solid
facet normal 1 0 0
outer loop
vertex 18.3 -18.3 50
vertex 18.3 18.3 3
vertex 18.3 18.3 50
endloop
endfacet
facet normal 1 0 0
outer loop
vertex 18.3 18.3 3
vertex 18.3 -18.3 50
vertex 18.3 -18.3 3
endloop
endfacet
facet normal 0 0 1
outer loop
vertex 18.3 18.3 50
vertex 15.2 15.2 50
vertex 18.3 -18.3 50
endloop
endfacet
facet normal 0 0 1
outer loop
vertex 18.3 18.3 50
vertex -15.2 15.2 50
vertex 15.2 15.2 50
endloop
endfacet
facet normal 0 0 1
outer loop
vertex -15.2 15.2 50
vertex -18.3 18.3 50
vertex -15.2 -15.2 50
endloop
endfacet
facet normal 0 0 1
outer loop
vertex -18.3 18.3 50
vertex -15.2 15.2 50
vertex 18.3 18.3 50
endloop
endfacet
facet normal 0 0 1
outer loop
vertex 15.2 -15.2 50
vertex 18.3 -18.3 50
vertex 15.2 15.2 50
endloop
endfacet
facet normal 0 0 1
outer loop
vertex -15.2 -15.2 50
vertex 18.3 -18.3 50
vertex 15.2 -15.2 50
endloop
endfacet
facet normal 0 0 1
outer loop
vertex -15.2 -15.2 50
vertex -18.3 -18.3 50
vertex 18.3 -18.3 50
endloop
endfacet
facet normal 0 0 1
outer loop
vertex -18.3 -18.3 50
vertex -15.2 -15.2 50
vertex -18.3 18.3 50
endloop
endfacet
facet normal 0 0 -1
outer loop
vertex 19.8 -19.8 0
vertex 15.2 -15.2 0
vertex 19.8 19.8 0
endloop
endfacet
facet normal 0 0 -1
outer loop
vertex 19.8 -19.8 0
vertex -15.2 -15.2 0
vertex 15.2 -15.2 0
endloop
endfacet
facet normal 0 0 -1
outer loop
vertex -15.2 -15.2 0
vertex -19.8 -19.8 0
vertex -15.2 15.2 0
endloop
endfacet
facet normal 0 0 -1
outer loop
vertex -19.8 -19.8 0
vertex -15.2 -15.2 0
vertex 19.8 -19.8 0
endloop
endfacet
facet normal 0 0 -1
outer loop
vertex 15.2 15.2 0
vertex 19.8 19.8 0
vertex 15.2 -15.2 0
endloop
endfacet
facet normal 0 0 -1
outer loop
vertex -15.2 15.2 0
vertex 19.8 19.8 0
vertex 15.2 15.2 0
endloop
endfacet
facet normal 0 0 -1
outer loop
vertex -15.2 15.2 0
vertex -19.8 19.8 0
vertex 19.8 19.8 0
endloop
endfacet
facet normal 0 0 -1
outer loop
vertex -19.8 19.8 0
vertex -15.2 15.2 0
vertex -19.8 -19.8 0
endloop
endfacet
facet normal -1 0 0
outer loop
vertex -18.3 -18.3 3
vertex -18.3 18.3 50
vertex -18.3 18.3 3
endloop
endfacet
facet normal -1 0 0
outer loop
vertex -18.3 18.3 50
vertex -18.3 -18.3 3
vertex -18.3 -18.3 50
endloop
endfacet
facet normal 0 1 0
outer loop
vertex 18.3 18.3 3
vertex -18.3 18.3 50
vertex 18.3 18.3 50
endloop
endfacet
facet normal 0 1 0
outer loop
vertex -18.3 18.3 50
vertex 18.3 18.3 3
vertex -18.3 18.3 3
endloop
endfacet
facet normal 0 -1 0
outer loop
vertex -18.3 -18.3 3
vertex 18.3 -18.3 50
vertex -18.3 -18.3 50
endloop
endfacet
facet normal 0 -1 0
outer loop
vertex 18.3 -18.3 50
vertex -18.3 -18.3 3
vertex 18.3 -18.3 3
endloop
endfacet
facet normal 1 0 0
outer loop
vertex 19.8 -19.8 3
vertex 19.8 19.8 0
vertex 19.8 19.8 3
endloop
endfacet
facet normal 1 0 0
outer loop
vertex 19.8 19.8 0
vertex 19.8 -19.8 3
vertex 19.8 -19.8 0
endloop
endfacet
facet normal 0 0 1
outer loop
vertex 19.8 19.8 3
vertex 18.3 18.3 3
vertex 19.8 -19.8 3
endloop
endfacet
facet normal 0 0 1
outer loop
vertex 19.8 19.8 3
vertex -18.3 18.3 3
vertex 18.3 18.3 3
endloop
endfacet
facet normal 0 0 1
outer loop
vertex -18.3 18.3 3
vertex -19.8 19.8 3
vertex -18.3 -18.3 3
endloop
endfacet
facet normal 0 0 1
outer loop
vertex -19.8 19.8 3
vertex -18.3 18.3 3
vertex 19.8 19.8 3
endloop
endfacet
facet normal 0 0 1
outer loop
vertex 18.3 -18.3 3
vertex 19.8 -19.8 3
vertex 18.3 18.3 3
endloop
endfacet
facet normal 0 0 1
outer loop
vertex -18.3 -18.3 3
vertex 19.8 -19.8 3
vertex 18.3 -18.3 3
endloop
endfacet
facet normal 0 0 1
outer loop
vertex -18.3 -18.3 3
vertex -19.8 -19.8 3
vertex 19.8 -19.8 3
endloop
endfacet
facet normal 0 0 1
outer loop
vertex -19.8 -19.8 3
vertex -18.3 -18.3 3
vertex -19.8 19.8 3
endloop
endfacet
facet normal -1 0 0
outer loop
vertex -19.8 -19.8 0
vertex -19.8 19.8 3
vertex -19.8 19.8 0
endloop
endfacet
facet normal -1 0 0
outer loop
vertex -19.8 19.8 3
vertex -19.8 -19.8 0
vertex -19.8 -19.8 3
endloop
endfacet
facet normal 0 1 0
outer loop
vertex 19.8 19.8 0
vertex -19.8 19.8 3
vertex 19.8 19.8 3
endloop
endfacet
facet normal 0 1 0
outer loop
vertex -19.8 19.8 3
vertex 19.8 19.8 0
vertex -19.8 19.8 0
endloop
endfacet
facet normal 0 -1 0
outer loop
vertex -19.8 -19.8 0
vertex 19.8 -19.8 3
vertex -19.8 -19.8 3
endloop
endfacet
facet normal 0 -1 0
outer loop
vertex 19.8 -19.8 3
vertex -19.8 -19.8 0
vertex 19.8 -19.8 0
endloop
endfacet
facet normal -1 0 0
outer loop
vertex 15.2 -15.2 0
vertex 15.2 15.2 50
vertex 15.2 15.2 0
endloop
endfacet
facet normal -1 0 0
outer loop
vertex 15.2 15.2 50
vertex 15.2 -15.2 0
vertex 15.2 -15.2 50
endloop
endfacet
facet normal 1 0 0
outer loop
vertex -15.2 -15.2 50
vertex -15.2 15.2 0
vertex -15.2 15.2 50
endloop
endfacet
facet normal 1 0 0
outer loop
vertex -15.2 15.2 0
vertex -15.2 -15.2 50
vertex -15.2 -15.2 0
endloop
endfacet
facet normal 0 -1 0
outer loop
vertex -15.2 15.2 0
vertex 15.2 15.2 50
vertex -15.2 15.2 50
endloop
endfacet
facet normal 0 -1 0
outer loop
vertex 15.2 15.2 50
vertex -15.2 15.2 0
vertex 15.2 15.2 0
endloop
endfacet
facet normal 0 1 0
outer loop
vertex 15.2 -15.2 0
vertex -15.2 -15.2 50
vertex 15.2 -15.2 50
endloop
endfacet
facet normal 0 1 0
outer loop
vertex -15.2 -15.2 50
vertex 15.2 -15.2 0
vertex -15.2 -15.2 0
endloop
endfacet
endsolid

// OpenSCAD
height = 50;
large_l = 36.6;
small_l = 30.4;
lip_l = 3;
lip_h = 3;
post_height = 0;

difference(){
    union(){
        translate( [ - large_l / 2, - large_l / 2, 0 ] )
            cube( [ large_l, large_l, height + post_height ] );
        translate( [ - ( large_l + lip_l ) / 2, - ( large_l + lip_l ) / 2, 0 ] )
            cube( [ large_l + lip_l, large_l + lip_l, lip_h ] );
    }
    
    translate( [ - small_l / 2, - small_l / 2, -0.1 ] )
            cube( [ small_l, small_l, height + post_height + 0.2 ] );
}
